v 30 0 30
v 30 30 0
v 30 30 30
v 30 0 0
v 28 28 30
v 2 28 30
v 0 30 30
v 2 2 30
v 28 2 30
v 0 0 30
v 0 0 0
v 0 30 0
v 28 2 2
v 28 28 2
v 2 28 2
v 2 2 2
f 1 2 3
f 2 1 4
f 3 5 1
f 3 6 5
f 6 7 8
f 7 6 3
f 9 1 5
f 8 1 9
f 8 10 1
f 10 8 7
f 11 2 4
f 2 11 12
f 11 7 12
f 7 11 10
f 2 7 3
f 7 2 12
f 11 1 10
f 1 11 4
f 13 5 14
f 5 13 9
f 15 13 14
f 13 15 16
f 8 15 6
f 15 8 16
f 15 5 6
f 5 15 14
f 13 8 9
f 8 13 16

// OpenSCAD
csize = 30;
thickness = 2;

difference() {
    cube(size=csize);
    translate([thickness, thickness, thickness]){
        cube([
            csize - 2 * thickness,
            csize - 2 * thickness,
            csize
        ]);
    };
};
